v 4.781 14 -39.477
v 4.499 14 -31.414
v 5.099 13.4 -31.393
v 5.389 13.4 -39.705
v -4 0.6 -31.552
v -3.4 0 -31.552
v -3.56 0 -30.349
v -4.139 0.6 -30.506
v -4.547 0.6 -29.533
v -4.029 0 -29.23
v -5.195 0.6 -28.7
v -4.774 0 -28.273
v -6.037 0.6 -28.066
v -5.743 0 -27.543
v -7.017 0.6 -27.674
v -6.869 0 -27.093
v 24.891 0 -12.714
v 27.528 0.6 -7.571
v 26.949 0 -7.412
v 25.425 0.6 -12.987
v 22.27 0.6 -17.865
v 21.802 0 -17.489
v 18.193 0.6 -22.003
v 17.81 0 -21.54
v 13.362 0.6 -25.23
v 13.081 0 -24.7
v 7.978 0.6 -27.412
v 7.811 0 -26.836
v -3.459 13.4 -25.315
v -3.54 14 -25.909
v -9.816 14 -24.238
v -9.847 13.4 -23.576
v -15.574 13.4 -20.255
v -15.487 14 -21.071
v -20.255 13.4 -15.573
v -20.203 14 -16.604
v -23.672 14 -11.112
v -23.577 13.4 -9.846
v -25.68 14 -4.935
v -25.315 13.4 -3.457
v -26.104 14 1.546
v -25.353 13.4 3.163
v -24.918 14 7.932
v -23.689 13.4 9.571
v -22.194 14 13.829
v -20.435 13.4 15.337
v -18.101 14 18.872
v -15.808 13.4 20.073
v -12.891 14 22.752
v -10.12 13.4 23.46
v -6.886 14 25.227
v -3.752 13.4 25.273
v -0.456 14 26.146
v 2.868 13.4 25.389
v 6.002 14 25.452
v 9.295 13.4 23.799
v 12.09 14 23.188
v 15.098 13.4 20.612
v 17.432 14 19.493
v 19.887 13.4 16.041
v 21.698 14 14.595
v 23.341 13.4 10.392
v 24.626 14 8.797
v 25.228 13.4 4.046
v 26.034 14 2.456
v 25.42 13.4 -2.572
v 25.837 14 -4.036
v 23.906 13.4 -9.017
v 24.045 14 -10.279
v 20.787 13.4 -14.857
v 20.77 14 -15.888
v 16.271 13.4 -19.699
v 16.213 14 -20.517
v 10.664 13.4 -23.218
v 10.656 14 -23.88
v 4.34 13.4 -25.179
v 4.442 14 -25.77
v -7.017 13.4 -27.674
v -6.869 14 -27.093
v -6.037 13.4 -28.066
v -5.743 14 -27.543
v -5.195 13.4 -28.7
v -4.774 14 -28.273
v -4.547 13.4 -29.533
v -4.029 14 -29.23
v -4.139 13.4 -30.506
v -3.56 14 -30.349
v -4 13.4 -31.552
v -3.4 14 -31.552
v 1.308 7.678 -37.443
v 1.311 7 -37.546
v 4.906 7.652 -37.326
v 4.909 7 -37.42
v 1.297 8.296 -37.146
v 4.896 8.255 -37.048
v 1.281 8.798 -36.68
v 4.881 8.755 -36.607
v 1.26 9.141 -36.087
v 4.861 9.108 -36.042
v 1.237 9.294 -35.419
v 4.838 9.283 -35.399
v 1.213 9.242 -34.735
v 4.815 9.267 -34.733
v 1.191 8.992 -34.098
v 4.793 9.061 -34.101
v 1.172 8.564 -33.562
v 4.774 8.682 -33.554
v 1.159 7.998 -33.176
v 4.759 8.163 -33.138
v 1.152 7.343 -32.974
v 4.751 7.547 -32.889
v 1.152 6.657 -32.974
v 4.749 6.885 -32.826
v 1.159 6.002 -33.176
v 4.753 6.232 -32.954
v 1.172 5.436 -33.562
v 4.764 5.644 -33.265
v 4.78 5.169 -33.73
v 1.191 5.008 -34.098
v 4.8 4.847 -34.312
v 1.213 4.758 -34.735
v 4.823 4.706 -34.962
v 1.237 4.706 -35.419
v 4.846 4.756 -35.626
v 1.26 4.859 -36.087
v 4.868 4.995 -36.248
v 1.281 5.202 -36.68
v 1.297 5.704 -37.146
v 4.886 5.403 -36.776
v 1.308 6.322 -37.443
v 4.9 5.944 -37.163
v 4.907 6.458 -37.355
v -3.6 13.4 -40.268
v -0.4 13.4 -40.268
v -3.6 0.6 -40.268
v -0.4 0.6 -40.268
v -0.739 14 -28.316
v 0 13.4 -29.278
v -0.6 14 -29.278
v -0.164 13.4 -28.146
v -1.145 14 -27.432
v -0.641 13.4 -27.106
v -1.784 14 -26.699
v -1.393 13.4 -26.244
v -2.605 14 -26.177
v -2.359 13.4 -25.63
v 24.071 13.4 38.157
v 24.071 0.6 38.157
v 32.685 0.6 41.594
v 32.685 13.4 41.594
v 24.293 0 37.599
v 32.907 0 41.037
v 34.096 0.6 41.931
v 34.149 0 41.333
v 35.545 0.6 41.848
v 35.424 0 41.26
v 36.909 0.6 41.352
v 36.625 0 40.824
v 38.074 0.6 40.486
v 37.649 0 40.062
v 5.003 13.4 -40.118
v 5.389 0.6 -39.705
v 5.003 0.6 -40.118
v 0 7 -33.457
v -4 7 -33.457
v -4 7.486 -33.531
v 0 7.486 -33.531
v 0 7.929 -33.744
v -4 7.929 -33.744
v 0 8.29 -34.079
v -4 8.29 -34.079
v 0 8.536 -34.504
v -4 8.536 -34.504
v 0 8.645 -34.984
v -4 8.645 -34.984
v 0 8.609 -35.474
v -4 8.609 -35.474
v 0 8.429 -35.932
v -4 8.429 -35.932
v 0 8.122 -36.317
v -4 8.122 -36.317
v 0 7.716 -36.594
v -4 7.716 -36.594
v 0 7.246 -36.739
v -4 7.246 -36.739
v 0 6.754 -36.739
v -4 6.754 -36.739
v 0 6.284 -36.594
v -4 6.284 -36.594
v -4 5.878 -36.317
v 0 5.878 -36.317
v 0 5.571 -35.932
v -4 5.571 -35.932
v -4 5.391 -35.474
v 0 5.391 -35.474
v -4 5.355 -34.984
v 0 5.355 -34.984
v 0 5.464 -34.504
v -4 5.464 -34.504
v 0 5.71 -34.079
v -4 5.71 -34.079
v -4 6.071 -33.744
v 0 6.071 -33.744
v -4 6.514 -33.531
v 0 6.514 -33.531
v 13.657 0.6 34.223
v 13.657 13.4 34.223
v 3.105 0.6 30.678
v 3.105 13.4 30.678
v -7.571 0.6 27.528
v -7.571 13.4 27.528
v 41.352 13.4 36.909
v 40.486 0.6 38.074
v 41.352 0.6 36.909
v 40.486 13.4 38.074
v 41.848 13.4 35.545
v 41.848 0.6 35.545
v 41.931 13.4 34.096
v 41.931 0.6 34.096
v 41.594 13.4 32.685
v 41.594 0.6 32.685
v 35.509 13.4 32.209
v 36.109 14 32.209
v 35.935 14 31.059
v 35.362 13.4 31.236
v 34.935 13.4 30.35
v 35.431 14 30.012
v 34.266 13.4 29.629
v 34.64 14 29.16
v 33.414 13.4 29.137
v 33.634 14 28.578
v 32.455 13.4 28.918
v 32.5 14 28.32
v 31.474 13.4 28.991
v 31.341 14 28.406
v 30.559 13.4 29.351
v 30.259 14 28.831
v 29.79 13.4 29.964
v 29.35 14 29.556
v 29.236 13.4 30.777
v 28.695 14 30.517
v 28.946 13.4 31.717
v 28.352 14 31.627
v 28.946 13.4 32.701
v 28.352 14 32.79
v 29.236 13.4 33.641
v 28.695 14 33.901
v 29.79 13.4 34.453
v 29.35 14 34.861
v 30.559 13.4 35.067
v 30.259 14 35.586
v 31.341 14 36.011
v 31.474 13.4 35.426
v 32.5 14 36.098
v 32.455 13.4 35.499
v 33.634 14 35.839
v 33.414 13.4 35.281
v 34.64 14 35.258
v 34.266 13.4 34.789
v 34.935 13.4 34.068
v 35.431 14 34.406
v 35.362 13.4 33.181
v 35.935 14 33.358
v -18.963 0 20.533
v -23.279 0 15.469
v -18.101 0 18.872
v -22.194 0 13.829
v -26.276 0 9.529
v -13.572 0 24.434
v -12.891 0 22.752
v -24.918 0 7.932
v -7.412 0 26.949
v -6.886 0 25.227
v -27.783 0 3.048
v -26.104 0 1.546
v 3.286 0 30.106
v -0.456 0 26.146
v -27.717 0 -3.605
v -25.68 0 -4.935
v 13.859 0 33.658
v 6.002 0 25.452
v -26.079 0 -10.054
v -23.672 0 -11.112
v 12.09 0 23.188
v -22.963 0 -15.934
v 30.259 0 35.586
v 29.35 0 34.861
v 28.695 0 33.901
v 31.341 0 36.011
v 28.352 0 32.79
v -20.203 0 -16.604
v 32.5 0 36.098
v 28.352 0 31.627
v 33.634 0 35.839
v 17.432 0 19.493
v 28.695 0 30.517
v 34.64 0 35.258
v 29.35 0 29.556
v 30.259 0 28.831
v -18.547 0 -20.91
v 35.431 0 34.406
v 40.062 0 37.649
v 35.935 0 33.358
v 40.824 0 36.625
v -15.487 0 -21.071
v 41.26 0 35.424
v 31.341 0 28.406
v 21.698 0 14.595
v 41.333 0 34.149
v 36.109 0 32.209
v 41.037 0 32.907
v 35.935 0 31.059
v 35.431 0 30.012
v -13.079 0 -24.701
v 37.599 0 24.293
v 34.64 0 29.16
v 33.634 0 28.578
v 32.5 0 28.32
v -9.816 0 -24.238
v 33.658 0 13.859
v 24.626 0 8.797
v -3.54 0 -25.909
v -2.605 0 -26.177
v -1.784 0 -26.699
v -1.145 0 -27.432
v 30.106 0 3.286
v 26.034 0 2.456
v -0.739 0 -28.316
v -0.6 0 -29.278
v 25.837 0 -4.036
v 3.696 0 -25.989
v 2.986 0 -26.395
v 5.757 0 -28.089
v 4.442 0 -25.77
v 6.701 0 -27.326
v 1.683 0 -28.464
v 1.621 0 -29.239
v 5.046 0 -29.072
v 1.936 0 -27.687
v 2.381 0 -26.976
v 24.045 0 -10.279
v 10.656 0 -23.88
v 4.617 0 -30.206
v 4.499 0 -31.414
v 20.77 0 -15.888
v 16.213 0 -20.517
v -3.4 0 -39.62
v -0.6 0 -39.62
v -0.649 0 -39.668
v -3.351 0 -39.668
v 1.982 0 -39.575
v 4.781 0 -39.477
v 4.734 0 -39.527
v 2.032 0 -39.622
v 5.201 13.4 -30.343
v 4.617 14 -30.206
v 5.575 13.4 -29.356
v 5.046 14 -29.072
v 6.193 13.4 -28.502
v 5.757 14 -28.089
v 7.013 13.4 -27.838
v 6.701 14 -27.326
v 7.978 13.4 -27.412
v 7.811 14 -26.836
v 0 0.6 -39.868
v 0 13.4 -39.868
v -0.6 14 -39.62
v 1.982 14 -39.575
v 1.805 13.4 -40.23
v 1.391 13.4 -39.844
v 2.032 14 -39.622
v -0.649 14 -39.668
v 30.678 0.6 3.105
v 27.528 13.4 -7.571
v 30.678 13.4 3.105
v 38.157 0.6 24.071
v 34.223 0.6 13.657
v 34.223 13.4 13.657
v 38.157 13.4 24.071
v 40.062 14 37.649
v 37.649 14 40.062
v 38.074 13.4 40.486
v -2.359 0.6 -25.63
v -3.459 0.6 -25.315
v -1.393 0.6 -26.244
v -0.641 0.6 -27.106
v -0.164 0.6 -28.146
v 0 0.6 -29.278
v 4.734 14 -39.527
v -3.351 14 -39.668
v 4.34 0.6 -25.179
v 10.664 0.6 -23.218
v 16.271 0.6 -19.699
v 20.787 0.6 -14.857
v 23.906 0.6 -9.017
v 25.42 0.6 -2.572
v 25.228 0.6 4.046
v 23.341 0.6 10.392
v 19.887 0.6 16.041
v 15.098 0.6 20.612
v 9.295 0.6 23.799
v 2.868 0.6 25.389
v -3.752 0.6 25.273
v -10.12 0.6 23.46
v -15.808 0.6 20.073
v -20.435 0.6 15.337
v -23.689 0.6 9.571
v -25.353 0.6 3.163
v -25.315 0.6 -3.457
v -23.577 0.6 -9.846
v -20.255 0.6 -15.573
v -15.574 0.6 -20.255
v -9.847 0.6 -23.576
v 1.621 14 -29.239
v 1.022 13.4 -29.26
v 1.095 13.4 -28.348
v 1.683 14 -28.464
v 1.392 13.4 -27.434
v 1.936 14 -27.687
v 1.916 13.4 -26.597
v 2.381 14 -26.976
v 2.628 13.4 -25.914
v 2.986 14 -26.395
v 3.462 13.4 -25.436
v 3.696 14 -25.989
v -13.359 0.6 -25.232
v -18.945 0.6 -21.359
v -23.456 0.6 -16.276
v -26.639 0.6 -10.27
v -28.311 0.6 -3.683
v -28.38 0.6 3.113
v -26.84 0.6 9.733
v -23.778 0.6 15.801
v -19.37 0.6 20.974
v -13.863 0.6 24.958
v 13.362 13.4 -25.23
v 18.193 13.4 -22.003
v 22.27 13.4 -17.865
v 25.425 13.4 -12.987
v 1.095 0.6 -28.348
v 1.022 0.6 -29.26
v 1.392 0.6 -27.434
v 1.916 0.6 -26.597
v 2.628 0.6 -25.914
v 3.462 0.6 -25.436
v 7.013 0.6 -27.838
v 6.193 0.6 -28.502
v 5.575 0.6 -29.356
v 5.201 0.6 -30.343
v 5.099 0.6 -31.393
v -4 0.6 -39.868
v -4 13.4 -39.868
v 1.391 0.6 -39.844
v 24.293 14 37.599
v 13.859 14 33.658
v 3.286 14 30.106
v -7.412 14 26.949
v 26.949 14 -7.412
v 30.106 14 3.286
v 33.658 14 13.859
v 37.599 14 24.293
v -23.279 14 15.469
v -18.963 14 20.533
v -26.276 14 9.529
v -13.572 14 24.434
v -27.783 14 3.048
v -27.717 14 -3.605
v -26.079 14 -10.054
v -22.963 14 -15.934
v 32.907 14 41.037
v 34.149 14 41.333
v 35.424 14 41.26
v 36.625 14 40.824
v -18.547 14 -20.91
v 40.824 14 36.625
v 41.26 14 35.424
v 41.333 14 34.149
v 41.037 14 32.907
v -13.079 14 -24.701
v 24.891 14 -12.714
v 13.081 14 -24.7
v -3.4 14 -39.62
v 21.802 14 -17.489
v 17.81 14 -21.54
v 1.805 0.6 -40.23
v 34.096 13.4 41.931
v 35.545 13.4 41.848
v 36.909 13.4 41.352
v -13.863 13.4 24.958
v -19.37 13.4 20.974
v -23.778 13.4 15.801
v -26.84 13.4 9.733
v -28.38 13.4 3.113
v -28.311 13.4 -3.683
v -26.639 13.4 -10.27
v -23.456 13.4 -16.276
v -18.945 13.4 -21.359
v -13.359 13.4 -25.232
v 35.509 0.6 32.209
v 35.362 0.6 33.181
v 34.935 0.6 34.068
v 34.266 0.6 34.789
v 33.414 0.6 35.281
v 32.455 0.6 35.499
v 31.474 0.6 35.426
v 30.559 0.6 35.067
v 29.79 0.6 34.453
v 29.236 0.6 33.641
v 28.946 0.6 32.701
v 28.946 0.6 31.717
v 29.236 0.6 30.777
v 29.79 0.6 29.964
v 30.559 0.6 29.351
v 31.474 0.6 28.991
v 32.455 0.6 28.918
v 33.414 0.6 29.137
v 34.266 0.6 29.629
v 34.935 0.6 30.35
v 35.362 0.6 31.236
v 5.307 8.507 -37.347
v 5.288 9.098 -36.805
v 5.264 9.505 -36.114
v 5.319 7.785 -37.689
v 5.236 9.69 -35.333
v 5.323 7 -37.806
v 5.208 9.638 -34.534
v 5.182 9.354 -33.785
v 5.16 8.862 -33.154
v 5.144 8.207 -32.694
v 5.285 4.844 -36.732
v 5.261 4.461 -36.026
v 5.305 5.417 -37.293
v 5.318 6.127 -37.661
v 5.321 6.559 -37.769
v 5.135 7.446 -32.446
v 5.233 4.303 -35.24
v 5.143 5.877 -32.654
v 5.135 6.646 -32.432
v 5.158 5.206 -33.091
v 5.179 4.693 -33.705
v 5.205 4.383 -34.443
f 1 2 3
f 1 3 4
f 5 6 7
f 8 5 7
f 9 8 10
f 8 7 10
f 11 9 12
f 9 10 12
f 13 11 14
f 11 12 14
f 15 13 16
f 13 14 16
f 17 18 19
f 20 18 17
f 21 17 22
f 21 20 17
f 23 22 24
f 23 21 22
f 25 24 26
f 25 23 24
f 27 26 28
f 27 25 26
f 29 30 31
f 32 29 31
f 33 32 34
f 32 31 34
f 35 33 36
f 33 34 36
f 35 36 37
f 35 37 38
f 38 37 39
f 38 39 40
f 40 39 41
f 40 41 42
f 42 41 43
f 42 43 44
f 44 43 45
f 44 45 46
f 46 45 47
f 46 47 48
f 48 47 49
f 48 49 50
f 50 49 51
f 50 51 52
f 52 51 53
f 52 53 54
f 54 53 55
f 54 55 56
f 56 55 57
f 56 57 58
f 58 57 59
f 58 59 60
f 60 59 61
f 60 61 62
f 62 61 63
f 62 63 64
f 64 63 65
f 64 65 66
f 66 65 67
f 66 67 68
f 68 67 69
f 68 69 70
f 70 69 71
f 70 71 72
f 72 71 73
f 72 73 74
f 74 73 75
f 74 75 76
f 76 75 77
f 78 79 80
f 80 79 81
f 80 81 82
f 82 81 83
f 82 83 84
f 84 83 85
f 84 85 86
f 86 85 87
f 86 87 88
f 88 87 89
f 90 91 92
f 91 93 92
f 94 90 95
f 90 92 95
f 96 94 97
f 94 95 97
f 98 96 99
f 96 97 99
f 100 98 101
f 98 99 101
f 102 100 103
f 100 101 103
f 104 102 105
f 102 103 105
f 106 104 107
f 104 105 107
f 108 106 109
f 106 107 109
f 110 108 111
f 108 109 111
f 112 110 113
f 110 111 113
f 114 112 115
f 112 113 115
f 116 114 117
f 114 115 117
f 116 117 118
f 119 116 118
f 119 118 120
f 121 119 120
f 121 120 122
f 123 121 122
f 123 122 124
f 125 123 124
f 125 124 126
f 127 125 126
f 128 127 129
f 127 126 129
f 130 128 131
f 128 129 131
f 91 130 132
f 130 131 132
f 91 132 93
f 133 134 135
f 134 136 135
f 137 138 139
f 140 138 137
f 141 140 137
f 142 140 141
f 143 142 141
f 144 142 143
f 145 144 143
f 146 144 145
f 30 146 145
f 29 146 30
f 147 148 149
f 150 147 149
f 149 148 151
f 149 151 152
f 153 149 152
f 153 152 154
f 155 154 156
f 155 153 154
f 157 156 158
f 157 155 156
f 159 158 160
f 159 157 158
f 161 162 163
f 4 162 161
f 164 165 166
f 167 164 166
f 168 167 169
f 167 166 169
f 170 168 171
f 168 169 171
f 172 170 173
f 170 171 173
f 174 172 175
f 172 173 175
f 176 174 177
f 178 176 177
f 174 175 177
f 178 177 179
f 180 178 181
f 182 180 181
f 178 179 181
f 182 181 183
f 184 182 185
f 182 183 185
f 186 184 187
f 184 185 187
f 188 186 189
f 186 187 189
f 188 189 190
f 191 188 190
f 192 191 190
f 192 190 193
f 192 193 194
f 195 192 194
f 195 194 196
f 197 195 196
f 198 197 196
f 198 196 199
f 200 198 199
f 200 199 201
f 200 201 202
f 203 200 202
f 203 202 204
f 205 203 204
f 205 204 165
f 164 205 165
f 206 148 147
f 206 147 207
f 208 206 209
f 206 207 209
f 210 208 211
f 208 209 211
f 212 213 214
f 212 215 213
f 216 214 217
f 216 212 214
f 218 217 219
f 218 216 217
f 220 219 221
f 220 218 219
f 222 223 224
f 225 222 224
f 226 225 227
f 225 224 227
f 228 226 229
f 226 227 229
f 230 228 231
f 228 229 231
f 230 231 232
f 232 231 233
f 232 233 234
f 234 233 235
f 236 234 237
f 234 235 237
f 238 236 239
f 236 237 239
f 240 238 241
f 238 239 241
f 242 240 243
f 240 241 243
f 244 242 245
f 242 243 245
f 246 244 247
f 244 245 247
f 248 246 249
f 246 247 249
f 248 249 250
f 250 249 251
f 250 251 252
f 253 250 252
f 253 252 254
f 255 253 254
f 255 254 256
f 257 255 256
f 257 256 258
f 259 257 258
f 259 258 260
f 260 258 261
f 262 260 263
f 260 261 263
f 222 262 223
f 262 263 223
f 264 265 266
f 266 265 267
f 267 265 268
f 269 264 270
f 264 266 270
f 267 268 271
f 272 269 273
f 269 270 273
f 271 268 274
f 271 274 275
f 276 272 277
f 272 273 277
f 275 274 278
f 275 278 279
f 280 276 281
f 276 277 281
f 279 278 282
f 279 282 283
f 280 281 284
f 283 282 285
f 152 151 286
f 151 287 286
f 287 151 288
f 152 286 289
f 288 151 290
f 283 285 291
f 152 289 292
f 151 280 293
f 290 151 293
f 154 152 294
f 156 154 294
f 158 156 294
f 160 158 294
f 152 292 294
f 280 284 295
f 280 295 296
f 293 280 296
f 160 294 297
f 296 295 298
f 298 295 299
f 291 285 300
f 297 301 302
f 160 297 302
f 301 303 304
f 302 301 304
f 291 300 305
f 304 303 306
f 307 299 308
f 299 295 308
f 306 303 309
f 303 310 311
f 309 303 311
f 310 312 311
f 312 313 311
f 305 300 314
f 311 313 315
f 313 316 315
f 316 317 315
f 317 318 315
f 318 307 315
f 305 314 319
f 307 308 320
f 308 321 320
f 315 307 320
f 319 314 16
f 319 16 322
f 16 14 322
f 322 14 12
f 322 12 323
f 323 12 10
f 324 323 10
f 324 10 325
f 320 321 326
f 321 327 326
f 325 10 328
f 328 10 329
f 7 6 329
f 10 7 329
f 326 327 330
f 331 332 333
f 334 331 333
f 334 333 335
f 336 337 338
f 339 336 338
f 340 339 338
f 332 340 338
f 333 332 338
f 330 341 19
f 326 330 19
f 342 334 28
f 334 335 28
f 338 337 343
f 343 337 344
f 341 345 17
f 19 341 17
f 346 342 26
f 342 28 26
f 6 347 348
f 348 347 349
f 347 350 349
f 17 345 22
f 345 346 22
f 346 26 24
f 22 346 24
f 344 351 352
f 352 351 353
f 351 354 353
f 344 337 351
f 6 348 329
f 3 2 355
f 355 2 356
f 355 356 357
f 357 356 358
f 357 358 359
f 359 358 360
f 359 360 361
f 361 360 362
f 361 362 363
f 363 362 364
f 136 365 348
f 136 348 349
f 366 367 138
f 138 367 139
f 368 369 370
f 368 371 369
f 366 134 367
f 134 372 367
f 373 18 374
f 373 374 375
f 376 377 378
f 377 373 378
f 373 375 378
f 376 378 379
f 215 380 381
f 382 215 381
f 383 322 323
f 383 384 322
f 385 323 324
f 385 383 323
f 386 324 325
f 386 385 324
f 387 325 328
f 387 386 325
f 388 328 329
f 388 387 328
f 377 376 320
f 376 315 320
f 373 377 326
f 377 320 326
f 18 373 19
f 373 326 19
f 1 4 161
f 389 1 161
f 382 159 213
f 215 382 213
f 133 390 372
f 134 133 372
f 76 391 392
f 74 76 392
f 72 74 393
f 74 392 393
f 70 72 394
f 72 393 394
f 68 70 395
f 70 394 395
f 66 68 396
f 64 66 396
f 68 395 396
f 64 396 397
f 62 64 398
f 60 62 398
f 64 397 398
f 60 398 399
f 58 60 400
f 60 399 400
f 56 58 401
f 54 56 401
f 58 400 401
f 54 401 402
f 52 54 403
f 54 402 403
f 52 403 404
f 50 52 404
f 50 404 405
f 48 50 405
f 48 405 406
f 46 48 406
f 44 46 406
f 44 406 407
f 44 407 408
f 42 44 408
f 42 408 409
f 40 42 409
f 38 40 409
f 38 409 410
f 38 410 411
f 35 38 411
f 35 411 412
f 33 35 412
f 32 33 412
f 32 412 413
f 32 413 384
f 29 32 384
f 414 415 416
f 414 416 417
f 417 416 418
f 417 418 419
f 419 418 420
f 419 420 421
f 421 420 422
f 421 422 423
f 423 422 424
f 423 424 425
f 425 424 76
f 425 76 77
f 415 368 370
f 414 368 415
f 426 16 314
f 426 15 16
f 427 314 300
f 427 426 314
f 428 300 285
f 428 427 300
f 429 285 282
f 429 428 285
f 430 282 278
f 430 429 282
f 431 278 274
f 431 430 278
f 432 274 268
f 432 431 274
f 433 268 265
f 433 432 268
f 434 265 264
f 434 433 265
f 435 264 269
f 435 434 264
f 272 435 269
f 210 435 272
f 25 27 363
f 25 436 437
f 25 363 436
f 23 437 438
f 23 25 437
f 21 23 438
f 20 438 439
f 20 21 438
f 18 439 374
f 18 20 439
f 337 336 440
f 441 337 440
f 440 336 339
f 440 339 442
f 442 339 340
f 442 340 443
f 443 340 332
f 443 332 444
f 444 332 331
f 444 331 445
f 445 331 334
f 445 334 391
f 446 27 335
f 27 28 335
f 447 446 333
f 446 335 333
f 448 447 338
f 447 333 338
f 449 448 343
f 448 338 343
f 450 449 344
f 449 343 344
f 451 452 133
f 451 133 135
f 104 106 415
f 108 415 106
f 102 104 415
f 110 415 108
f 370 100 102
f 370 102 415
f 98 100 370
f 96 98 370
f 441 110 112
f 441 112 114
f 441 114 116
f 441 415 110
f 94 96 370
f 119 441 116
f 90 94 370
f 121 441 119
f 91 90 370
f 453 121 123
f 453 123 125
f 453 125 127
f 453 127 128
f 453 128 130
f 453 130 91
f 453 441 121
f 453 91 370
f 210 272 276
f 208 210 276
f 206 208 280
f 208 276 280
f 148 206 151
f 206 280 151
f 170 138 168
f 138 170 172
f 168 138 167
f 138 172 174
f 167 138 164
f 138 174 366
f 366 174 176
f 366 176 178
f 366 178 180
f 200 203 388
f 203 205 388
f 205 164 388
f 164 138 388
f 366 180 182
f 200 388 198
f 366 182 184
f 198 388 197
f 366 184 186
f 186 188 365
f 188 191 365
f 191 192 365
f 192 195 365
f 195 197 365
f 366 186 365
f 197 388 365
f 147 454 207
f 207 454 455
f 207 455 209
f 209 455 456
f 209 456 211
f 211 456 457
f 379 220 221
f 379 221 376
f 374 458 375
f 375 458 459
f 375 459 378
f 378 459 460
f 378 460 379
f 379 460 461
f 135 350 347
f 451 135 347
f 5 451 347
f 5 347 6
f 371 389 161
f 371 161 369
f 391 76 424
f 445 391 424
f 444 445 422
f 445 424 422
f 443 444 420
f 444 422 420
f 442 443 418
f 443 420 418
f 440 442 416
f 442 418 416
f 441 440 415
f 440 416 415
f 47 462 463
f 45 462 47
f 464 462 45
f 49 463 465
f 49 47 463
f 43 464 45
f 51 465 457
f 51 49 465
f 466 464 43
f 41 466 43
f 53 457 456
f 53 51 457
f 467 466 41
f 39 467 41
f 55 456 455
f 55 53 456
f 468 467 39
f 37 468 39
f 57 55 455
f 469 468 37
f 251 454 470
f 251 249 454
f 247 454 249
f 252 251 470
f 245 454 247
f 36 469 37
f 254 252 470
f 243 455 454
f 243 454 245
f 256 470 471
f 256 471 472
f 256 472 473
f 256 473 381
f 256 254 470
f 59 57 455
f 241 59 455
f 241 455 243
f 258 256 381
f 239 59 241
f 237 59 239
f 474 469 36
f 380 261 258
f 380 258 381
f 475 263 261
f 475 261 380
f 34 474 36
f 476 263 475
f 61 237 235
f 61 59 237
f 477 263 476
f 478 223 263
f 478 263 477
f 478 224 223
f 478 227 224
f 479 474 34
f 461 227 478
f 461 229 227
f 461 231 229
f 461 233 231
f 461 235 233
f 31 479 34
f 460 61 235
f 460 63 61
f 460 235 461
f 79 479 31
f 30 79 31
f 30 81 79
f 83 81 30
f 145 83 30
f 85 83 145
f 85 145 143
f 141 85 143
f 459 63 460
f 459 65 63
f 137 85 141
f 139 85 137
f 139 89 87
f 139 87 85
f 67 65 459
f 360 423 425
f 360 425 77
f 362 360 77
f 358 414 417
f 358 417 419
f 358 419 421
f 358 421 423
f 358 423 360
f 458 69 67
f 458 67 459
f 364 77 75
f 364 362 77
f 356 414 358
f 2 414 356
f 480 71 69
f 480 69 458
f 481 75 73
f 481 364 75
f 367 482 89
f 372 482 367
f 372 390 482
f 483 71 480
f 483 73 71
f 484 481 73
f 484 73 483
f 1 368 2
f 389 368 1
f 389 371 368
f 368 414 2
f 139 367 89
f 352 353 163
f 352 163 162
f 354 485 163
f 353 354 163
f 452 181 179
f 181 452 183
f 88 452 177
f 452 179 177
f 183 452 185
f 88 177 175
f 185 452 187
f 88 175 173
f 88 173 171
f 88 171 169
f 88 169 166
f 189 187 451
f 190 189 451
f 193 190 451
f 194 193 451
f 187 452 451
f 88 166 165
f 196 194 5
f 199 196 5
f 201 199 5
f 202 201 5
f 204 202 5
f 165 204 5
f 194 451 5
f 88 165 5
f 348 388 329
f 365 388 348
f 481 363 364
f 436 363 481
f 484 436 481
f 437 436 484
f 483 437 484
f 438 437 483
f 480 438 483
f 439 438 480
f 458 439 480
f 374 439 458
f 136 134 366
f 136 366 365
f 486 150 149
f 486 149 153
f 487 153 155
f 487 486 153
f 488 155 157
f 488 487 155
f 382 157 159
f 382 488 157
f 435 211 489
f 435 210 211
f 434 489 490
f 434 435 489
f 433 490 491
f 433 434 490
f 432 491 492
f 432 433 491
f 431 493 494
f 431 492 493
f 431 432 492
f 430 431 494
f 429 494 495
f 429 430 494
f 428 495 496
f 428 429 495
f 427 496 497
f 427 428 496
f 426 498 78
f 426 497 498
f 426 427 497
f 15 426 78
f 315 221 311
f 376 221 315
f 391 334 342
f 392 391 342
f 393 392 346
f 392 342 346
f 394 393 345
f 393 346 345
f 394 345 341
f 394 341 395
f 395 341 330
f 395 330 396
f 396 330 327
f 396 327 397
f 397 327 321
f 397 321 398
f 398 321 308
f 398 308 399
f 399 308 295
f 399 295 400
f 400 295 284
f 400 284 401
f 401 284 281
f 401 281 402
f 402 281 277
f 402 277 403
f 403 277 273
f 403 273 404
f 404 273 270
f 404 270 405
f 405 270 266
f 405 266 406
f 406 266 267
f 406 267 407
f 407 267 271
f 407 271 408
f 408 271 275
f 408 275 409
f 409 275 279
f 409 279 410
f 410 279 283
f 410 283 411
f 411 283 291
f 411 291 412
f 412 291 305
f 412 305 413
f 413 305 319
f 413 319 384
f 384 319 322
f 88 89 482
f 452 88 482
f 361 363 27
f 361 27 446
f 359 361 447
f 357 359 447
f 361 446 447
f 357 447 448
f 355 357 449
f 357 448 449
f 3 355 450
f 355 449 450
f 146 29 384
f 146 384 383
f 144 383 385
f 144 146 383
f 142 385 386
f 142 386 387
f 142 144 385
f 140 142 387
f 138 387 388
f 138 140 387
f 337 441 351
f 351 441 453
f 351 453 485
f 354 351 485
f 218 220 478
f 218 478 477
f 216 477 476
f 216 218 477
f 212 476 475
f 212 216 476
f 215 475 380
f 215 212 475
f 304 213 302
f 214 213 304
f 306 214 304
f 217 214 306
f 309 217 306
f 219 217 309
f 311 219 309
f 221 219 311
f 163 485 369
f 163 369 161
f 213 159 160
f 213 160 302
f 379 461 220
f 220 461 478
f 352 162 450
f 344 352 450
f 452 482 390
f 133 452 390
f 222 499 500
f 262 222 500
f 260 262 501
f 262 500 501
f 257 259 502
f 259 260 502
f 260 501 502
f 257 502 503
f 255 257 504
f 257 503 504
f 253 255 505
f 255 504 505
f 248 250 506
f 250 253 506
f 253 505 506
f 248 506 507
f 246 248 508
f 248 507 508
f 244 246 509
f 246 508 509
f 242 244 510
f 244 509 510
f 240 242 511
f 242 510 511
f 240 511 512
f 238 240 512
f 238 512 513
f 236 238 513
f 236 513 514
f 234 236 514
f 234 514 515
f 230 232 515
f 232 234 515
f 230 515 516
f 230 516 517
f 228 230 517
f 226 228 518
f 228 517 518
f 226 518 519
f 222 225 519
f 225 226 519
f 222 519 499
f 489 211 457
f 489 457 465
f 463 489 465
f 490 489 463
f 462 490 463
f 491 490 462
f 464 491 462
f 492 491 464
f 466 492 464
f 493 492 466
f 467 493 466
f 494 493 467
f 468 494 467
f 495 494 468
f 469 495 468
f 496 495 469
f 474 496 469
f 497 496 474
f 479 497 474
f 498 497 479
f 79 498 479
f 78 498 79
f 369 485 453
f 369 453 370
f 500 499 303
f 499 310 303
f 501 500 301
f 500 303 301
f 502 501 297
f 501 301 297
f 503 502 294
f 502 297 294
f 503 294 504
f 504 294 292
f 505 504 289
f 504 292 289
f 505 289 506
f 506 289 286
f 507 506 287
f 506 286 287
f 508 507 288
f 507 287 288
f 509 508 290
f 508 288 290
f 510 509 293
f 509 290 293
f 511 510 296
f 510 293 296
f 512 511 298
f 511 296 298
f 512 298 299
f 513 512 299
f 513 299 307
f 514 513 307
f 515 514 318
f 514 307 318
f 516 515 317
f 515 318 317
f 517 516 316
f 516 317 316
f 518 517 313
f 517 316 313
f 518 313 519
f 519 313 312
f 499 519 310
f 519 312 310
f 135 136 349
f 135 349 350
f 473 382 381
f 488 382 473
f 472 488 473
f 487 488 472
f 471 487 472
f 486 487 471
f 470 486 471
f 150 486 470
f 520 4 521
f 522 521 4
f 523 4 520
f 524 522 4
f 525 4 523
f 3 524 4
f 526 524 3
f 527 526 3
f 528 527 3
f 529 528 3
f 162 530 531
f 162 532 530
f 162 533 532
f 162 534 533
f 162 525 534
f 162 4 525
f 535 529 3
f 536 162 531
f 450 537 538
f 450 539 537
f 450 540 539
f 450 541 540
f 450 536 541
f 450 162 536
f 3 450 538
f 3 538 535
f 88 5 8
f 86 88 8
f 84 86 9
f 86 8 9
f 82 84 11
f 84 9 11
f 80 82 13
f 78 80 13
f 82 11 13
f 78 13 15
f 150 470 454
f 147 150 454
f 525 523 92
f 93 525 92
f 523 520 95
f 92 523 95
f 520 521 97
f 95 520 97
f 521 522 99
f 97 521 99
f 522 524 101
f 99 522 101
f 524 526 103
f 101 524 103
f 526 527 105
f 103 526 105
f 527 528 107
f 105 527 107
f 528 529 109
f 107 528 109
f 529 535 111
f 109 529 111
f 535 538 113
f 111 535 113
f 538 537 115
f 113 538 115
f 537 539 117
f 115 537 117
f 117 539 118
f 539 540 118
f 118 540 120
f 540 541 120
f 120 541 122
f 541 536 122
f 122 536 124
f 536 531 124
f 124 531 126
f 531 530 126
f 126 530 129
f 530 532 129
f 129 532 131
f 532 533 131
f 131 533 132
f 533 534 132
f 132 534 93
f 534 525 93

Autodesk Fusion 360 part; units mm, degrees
sketch "piston ref" plane through (0, 0, 0) normal (0, 1, 0) x (1, 0, 0)
  circle A0 centre (0, 0) radius 25.35
  circle A1 centre (0, 0) radius 25.55 construction
  dimension "d1" = 50.7
  dimension "d2" = 0.2
  dimension "d3" = 51.1
extrude "Extrude1" add sketch "piston ref" along normal blind 80 makes body 1
sketch "ring mounting" plane through (0, 0, 0) normal (0, 1, 0) x (1, 0, 0)
  circle A0 centre (0, 0) radius 25.55
  line L0 (0, 0) -> (0, 55) construction
  line L1 (0.9964, 28.5326) -> (1.4053, 40.2439)
  line L2 (0, 25.55) -> (0, 40.2684)
  line L3 (0, 40.2684) -> (-4, 40.2684)
  line L4 (-4, 40.2684) -> (-4, 31.5516)
  line L5 (1.4053, 40.2439) -> (5.4029, 40.1043)
  line L6 (5.4029, 40.1043) -> (5.0987, 31.3928)
  line L7 (0.9964, 28.5326) -> (0.8917, 25.5344)
  arc A1 (-7.0169, 27.6743) -> (-4, 31.5516) centre (-8, 31.5516) ccw
  arc A2 (5.0987, 31.3928) -> (7.9784, 27.4125) centre (9.0963, 31.2532) ccw
  line L8 (0, 0) -> (60.8712, -60.8712) construction
  line L9 (0, 0) -> (0, -44) construction
  line L10 (0, -28.55) -> (35.7442, -42.8153)
  line L11 (35.7442, -42.8153) -> (42.8153, -35.7442)
  line L12 (42.8153, -35.7442) -> (28.55, 0)
  line L13 (0, 0) -> (44, 0) construction
  arc A3 (-7.0169, 27.6743) -> (0, -28.55) centre (0, 0) ccw
  arc A4 (28.55, 0) -> (7.9784, 27.4125) centre (0, 0) ccw
  line L14 (18.0666, -18.0666) -> (1.7407, -34.3924) construction
  circle A5 centre (32.2087, -32.2087) radius 3.3
  line L15 (32.2087, -32.2087) -> (47.6032, -16.8142) construction
  point P0 (-4, 28.2684)
  point P1 (4.9841, 28.1116)
  dimension "d8" = 2
  dimension "d9" = 3
  dimension "d10" = 4
  dimension "d11" = 4
  dimension "d14" = 12
  dimension "d15" = 12
  dimension "d16" = 4
  dimension "d31" = 135
  dimension "d32" = 30
  dimension "d33" = 6.6
  dimension "d34" = 10
  dimension "d55" = 20
extrude "Extrude2" add sketch "ring mounting" along normal blind 14 separate body contours A0 L1 L2 L3 L4 L5 L6 L7 A1 A2 L10 L11 L12 A3 A4 makes body 2
sketch "heat insert hole" plane through (3.9976, 0, 0.1396) normal (0.999391, 0, 0.034899) x (0.034899, 0, -0.999391)
  line L0 (31.5516, 0) -> (40.2684, 0)
  line L1 (40.2684, 0) -> (40.2684, 14)
  line L2 (40.2684, 14) -> (31.5516, 14)
  line L3 (31.5516, 14) -> (31.5516, 0)
  circle A0 centre (35.2684, 7) radius 2.3
  line L4 (40.2684, 7) -> (31.5516, 7) construction
  line L5 (35.2684, 14) -> (35.2684, 0) construction
  dimension "d19" = 4.6
  dimension "d30" = 5
extrude "Extrude3" cut sketch "heat insert hole" against normal blind 4 contours A0 bodies 2
chamfer "Chamfer1" distance 0.4 angle 45 1 edges at (5.1536, 7.8317, -32.9643) on bodies 2
sketch "M3 hole" plane through (-4, 0, 0) normal (-1, 0, 0) x (0, 0, 1)
  line L0 (-40.2684, 0) -> (-31.5516, 0)
  line L1 (-31.5516, 0) -> (-31.5516, 14)
  line L2 (-31.5516, 14) -> (-40.2684, 14)
  line L3 (-40.2684, 14) -> (-40.2684, 0)
  ellipse E0 centre (-35.1073, 7) end of major axis (-35.1073, 9.3) minor radius 2.2986
  circle A0 centre (-35.1073, 7) radius 1.65
  dimension "d24" = 3.3
extrude "Extrude4" cut sketch "M3 hole" against normal blind 4 contours A0 bodies 2
fillet "Fillet1" radius 4 2 edges at (0, 7, -25.55) (0.8917, 7, -25.5344) on bodies 2
chamfer "Chamfer2" distance 0.4 angle 45 4 edges at (5.4029, 7, -40.1043) (1.4053, 7, -40.2439) (0, 7, -40.2684) (-4, 7, -40.2684) on bodies 2
fillet "Fillet2" radius 5 2 edges at (35.7442, 7, 42.8153) (42.8153, 7, 35.7442) on bodies 2
fillet "Fillet3" radius 300 2 edges at (28.55, 7, 0) (0, 7, 28.55) on bodies 2
chamfer "Chamfer6" distance 0.6 angle 45 2 faces at (28.301, 14, 19.6974) (28.301, 0, 19.6974) on bodies 2
chamfer "Chamfer5" [suppressed]
hidden bodies 1
equation "ringDistance = 20 mm"
